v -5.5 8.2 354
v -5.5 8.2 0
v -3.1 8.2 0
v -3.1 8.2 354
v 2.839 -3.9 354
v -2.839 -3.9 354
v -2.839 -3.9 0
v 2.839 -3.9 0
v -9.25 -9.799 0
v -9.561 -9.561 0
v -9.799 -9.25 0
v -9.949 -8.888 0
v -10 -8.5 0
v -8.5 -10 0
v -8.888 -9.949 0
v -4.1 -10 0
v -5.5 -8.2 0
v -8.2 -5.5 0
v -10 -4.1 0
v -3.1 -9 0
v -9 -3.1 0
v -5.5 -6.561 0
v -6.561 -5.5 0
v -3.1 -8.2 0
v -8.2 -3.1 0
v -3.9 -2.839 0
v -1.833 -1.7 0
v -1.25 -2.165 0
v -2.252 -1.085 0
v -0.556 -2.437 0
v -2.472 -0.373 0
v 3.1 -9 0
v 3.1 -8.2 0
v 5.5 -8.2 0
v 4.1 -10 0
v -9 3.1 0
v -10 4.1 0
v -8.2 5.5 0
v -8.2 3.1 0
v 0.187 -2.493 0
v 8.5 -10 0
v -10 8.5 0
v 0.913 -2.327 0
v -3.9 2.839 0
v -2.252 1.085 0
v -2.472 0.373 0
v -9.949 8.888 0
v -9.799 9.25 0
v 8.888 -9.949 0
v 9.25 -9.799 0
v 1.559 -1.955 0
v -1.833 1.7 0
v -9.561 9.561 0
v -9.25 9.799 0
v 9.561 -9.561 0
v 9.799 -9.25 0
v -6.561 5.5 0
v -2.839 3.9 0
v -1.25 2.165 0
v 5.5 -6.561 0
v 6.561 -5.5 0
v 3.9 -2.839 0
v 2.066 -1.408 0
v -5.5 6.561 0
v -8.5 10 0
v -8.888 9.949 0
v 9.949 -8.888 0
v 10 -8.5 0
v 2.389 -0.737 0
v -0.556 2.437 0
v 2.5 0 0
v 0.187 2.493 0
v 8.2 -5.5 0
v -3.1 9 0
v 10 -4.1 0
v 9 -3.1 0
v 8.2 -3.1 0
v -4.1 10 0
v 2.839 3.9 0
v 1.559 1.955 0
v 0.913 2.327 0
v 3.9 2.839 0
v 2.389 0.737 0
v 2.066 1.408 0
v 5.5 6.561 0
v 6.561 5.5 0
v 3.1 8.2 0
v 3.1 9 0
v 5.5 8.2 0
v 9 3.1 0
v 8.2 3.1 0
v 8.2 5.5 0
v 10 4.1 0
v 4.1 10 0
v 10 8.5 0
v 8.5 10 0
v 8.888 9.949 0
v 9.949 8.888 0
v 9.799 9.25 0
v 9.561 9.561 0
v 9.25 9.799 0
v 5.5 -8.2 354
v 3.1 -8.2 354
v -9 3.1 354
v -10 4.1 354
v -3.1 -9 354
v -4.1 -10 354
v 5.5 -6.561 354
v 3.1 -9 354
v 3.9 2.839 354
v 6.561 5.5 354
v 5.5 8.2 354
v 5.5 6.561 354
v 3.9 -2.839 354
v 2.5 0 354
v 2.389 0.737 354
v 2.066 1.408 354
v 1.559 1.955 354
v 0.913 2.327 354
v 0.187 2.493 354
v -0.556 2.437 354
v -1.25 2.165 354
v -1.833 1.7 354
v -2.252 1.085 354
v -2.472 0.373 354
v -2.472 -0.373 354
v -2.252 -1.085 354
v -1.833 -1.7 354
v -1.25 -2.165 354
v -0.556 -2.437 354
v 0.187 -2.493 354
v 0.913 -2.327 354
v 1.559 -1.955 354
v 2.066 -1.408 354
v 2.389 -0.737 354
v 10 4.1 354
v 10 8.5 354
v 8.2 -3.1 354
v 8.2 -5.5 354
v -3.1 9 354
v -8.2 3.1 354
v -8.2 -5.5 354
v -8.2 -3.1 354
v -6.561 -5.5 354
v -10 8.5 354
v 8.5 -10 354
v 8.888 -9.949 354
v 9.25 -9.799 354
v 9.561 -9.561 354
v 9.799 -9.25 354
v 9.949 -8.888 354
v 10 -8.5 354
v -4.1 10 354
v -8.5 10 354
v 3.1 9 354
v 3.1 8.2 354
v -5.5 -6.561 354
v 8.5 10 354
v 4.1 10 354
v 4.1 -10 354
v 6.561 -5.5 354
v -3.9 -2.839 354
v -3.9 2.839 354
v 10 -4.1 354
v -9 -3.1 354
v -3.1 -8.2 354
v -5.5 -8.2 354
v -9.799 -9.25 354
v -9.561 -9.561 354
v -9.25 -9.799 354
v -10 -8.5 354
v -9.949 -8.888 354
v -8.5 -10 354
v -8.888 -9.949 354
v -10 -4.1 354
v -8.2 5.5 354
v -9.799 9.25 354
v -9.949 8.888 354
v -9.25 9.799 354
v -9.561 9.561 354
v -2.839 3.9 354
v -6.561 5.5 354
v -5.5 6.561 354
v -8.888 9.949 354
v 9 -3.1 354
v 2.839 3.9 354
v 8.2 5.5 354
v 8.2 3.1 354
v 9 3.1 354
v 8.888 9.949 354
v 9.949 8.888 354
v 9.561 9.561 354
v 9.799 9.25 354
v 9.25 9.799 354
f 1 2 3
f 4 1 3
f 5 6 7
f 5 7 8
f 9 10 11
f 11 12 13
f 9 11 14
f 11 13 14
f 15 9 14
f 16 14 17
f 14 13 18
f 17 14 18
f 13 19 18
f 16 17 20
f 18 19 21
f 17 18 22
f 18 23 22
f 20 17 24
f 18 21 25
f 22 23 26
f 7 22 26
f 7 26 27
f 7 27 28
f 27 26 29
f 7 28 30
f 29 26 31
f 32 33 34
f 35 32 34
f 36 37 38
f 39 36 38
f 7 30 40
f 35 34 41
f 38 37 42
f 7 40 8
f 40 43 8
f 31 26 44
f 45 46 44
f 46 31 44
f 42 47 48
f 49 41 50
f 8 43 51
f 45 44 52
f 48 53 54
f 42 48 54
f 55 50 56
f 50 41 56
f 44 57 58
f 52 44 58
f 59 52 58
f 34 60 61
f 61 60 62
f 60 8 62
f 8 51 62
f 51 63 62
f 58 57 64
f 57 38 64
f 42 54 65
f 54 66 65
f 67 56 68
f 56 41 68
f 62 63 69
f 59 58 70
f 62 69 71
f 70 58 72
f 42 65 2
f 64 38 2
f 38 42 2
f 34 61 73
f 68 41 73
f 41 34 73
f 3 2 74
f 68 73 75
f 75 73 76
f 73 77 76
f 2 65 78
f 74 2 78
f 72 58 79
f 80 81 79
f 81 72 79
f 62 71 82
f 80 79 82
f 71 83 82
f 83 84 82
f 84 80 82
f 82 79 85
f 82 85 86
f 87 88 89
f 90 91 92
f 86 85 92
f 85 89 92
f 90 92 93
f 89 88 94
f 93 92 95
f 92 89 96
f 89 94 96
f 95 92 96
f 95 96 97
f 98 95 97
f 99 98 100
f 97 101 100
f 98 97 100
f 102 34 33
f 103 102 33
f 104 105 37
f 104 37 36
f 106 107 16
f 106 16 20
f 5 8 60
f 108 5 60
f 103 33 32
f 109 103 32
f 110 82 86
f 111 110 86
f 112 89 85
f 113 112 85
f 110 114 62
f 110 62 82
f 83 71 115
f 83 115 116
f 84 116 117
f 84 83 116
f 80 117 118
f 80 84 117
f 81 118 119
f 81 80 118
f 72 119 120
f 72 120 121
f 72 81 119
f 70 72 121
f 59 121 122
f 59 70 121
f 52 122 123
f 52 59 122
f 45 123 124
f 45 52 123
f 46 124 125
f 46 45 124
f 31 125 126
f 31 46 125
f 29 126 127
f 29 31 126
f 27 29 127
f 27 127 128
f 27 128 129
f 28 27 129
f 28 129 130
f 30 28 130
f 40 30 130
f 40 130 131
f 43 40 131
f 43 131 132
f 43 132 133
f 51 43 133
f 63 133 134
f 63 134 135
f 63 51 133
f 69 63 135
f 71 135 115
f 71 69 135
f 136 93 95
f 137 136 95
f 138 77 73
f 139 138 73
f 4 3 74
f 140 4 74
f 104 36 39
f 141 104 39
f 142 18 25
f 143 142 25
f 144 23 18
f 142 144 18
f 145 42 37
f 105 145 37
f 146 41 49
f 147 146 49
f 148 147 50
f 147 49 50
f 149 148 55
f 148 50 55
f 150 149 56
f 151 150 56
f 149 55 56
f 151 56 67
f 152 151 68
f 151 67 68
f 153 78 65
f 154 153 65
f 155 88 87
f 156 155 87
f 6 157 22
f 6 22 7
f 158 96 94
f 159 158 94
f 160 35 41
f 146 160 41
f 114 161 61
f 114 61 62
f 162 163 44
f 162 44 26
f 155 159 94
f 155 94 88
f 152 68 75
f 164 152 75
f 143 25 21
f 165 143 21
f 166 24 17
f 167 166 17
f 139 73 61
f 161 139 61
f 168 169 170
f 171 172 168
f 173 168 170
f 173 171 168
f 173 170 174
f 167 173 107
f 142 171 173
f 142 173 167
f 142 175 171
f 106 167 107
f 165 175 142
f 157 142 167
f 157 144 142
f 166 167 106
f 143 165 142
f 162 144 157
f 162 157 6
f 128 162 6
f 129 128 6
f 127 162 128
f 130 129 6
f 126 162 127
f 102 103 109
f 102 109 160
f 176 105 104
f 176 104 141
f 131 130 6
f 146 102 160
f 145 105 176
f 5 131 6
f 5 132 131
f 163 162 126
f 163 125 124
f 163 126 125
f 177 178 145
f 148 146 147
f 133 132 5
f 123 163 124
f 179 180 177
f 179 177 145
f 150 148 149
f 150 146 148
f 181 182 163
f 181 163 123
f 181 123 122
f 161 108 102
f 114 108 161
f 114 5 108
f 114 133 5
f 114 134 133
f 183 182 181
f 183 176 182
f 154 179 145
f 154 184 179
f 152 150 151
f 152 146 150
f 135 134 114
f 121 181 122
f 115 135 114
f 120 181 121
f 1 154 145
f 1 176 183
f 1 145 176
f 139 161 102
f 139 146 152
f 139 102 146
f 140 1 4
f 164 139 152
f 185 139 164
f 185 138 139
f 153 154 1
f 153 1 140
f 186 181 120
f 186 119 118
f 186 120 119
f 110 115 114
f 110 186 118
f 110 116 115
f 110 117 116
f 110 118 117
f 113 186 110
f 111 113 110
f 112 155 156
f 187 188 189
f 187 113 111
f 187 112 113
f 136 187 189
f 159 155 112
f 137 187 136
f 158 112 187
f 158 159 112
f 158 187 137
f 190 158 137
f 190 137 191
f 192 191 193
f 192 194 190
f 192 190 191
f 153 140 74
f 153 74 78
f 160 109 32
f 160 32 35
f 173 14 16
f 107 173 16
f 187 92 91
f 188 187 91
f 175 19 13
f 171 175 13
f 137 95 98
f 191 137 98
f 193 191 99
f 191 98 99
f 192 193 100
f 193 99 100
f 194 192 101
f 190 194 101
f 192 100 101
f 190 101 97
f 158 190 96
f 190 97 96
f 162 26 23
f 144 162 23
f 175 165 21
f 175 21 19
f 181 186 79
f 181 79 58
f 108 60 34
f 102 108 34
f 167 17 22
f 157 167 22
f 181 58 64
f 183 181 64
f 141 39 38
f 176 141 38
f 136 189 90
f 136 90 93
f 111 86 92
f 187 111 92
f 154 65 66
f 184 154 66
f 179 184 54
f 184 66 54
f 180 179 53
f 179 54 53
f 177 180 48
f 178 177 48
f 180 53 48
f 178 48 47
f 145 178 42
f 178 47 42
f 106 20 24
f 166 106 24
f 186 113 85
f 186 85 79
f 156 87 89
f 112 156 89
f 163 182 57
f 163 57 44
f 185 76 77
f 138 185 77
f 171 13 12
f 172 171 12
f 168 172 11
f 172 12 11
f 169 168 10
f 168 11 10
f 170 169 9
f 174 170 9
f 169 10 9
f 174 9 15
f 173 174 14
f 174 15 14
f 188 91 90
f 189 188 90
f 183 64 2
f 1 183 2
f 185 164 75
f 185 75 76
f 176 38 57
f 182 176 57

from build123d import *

# Parameters (mm, degrees)
SKETCH1_R           = 2.5
BOSS_EXTRUDE1_DEPTH = 354


with BuildPart() as part:
    # Sketch1 → Boss-Extrude1 (new body)
    with BuildSketch(Plane.XY):
        with BuildLine():
            Line((2.839339828, 3.9), (-2.839339828, 3.9))
            Line((-2.839339828, 3.9), (-5.5, 6.560660172))
            Line((-5.5, 6.560660172), (-5.5, 8.2))
            Line((-5.5, 8.2), (-3.1, 8.2))
            Line((-3.1, 8.2), (-3.1, 9))
            Line((-3.1, 9), (-4.1, 10))
            Line((-4.1, 10), (-8.5, 10))
            ThreePointArc((-8.5, 10), (-9.560660172, 9.560660172), (-10, 8.5))
            Line((-10, 8.5), (-10, 4.1))
            Line((-10, 4.1), (-9, 3.1))
            Line((-9, 3.1), (-8.2, 3.1))
            Line((-8.2, 3.1), (-8.2, 5.5))
            Line((-8.2, 5.5), (-6.560660172, 5.5))
            Line((-6.560660172, 5.5), (-3.9, 2.839339828))
            Line((-3.9, 2.839339828), (-3.9, -2.839339828))
            Line((-3.9, -2.839339828), (-6.560660172, -5.5))
            Line((-6.560660172, -5.5), (-8.2, -5.5))
            Line((-8.2, -5.5), (-8.2, -3.1))
            Line((-8.2, -3.1), (-9, -3.1))
            Line((-9, -3.1), (-10, -4.1))
            Line((-10, -4.1), (-10, -8.5))
            ThreePointArc((-10, -8.5), (-9.560660172, -9.560660172), (-8.5, -10))
            Line((-8.5, -10), (-4.1, -10))
            Line((-4.1, -10), (-3.1, -9))
            Line((-3.1, -9), (-3.1, -8.2))
            Line((-3.1, -8.2), (-5.5, -8.2))
            Line((-5.5, -8.2), (-5.5, -6.560660172))
            Line((-5.5, -6.560660172), (-2.839339828, -3.9))
            Line((-2.839339828, -3.9), (2.839339828, -3.9))
            Line((2.839339828, -3.9), (5.5, -6.560660172))
            Line((5.5, -6.560660172), (5.5, -8.2))
            Line((5.5, -8.2), (3.1, -8.2))
            Line((3.1, -8.2), (3.1, -9))
            Line((3.1, -9), (4.1, -10))
            Line((4.1, -10), (8.5, -10))
            ThreePointArc((8.5, -10), (9.560660172, -9.560660172), (10, -8.5))
            Line((10, -8.5), (10, -4.1))
            Line((10, -4.1), (9, -3.1))
            Line((9, -3.1), (8.2, -3.1))
            Line((8.2, -3.1), (8.2, -5.5))
            Line((8.2, -5.5), (6.560660172, -5.5))
            Line((6.560660172, -5.5), (3.9, -2.839339828))
            Line((3.9, -2.839339828), (3.9, 2.839339828))
            Line((3.9, 2.839339828), (6.560660172, 5.5))
            Line((6.560660172, 5.5), (8.2, 5.5))
            Line((8.2, 5.5), (8.2, 3.1))
            Line((8.2, 3.1), (9, 3.1))
            Line((9, 3.1), (10, 4.1))
            Line((10, 4.1), (10, 8.5))
            ThreePointArc((10, 8.5), (9.560660172, 9.560660172), (8.5, 10))
            Line((8.5, 10), (4.1, 10))
            Line((4.1, 10), (3.1, 9))
            Line((3.1, 9), (3.1, 8.2))
            Line((3.1, 8.2), (5.5, 8.2))
            Line((5.5, 8.2), (5.5, 6.560660172))
            Line((5.5, 6.560660172), (2.839339828, 3.9))
        make_face()
        Circle(SKETCH1_R, mode=Mode.SUBTRACT)
    extrude(amount=BOSS_EXTRUDE1_DEPTH)


solid = part.part
